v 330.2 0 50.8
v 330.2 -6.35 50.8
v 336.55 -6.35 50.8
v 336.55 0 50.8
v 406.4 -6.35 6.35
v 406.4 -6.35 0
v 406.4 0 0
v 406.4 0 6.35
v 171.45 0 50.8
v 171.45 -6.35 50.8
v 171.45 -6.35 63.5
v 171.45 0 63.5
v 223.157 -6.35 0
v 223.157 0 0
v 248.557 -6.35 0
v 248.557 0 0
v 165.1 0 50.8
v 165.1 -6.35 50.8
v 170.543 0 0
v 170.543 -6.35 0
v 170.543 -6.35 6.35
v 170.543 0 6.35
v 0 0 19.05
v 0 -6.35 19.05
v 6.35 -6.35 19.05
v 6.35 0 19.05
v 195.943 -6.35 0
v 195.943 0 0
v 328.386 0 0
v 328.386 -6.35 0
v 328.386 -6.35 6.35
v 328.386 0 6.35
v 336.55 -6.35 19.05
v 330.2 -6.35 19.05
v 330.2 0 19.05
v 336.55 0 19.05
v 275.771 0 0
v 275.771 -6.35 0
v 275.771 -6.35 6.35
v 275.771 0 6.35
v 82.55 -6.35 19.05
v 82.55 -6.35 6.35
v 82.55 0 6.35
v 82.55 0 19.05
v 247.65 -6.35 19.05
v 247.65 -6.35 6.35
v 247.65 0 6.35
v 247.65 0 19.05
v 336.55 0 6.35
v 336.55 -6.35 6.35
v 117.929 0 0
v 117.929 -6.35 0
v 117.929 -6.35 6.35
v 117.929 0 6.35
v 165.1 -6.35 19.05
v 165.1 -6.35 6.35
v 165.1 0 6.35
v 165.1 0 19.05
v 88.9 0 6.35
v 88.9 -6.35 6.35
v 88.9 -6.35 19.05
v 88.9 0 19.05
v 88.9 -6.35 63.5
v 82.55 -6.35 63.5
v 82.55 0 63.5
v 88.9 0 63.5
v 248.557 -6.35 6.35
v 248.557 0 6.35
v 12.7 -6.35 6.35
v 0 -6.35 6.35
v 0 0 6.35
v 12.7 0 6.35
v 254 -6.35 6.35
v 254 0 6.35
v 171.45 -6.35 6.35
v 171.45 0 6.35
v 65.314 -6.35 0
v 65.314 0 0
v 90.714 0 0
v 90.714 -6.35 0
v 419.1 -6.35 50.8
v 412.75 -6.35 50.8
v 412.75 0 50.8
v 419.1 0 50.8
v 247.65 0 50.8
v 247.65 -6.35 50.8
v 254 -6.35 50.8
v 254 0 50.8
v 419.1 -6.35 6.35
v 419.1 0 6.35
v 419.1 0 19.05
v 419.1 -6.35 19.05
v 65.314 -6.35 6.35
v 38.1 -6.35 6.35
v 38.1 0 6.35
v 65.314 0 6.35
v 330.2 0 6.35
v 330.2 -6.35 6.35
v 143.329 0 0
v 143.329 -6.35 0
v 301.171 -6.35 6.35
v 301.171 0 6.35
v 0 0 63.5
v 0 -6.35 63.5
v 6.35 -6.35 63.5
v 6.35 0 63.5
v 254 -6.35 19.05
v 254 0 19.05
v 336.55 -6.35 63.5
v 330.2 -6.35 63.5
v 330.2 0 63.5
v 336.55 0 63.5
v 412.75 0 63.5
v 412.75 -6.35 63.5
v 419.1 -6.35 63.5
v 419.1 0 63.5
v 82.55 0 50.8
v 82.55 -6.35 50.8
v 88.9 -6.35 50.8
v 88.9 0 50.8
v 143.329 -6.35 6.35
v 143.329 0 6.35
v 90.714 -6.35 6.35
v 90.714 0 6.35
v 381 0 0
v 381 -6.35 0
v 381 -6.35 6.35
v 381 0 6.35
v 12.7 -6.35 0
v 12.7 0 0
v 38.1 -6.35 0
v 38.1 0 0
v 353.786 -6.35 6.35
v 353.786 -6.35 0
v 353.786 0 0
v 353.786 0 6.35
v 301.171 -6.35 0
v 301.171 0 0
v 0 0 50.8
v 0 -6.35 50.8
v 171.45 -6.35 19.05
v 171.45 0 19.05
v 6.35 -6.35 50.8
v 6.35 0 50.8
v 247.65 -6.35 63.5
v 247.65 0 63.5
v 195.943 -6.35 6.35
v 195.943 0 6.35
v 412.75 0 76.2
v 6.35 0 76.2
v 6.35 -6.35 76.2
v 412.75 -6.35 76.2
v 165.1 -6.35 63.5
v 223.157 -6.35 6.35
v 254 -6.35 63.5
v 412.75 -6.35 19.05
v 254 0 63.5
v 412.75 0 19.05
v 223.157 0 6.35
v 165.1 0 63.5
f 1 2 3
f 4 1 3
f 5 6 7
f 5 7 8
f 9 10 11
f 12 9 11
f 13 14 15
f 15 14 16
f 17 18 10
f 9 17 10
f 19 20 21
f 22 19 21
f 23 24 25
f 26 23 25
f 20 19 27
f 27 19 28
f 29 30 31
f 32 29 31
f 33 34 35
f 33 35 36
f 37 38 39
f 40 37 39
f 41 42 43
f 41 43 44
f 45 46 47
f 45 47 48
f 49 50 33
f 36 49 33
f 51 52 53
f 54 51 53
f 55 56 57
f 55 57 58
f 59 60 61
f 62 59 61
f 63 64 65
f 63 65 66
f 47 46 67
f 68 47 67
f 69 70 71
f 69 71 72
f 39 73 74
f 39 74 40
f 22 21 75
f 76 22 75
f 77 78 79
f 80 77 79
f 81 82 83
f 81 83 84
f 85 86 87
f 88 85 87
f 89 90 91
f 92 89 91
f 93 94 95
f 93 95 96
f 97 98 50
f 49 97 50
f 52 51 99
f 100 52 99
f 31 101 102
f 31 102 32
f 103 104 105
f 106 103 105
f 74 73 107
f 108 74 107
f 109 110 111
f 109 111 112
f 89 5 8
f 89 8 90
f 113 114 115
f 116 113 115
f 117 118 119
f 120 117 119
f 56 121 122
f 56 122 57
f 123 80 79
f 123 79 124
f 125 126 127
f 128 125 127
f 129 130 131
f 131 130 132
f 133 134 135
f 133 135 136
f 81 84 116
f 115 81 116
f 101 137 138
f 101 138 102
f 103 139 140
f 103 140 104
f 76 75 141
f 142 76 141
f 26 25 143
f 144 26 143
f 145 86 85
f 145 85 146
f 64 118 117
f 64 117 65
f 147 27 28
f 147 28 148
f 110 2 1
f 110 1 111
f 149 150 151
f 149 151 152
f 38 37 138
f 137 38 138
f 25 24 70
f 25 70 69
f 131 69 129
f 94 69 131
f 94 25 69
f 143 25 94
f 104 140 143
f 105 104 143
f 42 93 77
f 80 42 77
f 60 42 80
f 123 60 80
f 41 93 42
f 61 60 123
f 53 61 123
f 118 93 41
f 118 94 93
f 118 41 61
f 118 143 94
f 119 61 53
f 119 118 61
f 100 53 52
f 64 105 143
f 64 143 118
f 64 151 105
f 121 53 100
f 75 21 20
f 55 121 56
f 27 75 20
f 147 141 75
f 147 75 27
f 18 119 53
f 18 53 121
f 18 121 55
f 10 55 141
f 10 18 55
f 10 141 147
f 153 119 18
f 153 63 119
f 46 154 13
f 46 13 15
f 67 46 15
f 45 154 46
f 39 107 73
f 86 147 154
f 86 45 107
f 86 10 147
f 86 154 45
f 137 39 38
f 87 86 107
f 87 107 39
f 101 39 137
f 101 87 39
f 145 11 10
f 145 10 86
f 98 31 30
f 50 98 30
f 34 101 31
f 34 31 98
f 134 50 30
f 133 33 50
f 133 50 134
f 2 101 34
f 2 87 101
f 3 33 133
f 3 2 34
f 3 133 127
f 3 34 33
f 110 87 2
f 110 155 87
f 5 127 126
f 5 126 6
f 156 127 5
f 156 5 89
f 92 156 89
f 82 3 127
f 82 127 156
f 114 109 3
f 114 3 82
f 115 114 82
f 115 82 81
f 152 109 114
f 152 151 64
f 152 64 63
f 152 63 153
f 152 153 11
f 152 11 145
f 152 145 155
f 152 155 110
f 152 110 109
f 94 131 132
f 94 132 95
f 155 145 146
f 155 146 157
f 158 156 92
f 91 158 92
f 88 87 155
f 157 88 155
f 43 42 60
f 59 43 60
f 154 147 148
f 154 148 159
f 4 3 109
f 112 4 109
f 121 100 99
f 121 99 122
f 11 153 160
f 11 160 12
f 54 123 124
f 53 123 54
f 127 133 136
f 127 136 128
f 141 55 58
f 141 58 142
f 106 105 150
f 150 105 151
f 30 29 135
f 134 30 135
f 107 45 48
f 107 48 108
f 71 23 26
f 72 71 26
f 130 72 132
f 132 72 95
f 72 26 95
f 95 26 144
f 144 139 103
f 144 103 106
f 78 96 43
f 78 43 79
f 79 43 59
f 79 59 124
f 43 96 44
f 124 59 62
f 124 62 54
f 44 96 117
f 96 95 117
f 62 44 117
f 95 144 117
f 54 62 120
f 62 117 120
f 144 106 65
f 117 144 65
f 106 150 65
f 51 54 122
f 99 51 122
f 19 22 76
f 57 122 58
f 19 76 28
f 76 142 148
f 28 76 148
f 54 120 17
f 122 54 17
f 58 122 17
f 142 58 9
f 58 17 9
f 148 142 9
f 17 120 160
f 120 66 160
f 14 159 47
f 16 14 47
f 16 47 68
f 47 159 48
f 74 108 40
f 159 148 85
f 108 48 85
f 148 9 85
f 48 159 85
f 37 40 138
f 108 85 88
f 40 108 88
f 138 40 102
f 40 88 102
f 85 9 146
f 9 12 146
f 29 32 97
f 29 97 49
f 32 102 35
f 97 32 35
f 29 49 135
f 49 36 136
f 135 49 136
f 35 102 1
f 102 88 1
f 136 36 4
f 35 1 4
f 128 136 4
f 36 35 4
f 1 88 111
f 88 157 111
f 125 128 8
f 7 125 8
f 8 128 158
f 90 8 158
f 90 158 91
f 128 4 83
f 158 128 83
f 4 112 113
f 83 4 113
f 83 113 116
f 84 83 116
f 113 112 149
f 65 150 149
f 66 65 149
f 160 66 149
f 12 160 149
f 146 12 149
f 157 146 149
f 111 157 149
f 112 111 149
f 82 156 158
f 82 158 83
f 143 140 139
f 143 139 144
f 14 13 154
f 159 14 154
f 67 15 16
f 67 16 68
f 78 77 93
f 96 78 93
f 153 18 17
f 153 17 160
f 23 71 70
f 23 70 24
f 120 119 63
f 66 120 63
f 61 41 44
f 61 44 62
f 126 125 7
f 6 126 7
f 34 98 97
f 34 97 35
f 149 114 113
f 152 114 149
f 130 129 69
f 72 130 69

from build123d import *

# Parameters (mm, degrees)
F0_W     = 419.1
F0_H     = 76.2
F1_DEPTH = 6.35
F2_W     = 6.35
F2_H     = 6.35
F2_H_2   = 12.7
F2_H_3   = 31.75
F3_DEPTH = 6.35
F4_W     = 27.214286
F4_H     = 6.35
F4_W_2   = 27.214285
F4_W_3   = 6.35
F5_DEPTH = 6.351
F6_W     = 6.35
F6_H     = 12.7
F7_DEPTH = 6.351


with BuildPart() as f1:
    # F0 (on Front) → F1 (new body)
    with BuildSketch(Plane.XZ):
        with Locations((209.55, 38.1)):
            Rectangle(F0_W, F0_H)
    extrude(amount=F1_DEPTH)

    # F2 (on face) → F3 (cut, through all)
    with BuildSketch(Plane.XZ.offset(6.35)):
        with Locations((3.175, 3.175)):
            Rectangle(F2_W, F2_H)
        with Locations((3.175, 69.85)):
            Rectangle(F2_W, F2_H_2)
        with Locations((3.175, 34.925)):
            Rectangle(F2_W, F2_H_3)
        with Locations((415.925, 3.175)):
            Rectangle(F2_W, F2_H)
        with Locations((415.925, 34.925)):
            Rectangle(F2_W, F2_H_3)
        with Locations((415.925, 69.85)):
            Rectangle(F2_W, F2_H_2)
    extrude(amount=-F3_DEPTH, mode=Mode.SUBTRACT)

    # F4 (on face) → F5 (cut, through all)
    with BuildSketch(Plane.XZ.offset(6.35)):
        with Locations((51.707143, 3.175)):
            Rectangle(F4_W, F4_H)
        with Locations((104.321428, 3.175)):
            Rectangle(F4_W_2, F4_H)
        with Locations((156.935714, 3.175)):
            Rectangle(F4_W, F4_H)
        with Locations((209.55, 3.175)):
            Rectangle(F4_W, F4_H)
        with Locations((262.164286, 3.175)):
            Rectangle(F4_W, F4_H)
        with Locations((314.778571, 3.175)):
            Rectangle(F4_W_2, F4_H)
        with Locations((367.392857, 3.175)):
            Rectangle(F4_W, F4_H)
        with Locations((9.525, 3.175)):
            Rectangle(F4_W_3, F4_H)
        with Locations((409.575, 3.175)):
            Rectangle(F4_W_3, F4_H)
    extrude(amount=-F5_DEPTH, mode=Mode.SUBTRACT)

    # F6 (on face) → F7 (cut, through all)
    with BuildSketch(Plane.XZ.offset(6.35)):
        with Locations((85.725, 12.7)):
            Rectangle(F6_W, F6_H)
        with Locations((85.725, 57.15)):
            Rectangle(F6_W, F6_H)
        with Locations((333.375, 57.15)):
            Rectangle(F6_W, F6_H)
        with Locations((333.375, 12.7)):
            Rectangle(F6_W, F6_H)
        with Locations((168.275, 57.15)):
            Rectangle(F6_W, F6_H)
        with Locations((168.275, 12.7)):
            Rectangle(F6_W, F6_H)
        with Locations((250.825, 57.15)):
            Rectangle(F6_W, F6_H)
        with Locations((250.825, 12.7)):
            Rectangle(F6_W, F6_H)
    extrude(amount=-F7_DEPTH, mode=Mode.SUBTRACT)


solid = f1.part
